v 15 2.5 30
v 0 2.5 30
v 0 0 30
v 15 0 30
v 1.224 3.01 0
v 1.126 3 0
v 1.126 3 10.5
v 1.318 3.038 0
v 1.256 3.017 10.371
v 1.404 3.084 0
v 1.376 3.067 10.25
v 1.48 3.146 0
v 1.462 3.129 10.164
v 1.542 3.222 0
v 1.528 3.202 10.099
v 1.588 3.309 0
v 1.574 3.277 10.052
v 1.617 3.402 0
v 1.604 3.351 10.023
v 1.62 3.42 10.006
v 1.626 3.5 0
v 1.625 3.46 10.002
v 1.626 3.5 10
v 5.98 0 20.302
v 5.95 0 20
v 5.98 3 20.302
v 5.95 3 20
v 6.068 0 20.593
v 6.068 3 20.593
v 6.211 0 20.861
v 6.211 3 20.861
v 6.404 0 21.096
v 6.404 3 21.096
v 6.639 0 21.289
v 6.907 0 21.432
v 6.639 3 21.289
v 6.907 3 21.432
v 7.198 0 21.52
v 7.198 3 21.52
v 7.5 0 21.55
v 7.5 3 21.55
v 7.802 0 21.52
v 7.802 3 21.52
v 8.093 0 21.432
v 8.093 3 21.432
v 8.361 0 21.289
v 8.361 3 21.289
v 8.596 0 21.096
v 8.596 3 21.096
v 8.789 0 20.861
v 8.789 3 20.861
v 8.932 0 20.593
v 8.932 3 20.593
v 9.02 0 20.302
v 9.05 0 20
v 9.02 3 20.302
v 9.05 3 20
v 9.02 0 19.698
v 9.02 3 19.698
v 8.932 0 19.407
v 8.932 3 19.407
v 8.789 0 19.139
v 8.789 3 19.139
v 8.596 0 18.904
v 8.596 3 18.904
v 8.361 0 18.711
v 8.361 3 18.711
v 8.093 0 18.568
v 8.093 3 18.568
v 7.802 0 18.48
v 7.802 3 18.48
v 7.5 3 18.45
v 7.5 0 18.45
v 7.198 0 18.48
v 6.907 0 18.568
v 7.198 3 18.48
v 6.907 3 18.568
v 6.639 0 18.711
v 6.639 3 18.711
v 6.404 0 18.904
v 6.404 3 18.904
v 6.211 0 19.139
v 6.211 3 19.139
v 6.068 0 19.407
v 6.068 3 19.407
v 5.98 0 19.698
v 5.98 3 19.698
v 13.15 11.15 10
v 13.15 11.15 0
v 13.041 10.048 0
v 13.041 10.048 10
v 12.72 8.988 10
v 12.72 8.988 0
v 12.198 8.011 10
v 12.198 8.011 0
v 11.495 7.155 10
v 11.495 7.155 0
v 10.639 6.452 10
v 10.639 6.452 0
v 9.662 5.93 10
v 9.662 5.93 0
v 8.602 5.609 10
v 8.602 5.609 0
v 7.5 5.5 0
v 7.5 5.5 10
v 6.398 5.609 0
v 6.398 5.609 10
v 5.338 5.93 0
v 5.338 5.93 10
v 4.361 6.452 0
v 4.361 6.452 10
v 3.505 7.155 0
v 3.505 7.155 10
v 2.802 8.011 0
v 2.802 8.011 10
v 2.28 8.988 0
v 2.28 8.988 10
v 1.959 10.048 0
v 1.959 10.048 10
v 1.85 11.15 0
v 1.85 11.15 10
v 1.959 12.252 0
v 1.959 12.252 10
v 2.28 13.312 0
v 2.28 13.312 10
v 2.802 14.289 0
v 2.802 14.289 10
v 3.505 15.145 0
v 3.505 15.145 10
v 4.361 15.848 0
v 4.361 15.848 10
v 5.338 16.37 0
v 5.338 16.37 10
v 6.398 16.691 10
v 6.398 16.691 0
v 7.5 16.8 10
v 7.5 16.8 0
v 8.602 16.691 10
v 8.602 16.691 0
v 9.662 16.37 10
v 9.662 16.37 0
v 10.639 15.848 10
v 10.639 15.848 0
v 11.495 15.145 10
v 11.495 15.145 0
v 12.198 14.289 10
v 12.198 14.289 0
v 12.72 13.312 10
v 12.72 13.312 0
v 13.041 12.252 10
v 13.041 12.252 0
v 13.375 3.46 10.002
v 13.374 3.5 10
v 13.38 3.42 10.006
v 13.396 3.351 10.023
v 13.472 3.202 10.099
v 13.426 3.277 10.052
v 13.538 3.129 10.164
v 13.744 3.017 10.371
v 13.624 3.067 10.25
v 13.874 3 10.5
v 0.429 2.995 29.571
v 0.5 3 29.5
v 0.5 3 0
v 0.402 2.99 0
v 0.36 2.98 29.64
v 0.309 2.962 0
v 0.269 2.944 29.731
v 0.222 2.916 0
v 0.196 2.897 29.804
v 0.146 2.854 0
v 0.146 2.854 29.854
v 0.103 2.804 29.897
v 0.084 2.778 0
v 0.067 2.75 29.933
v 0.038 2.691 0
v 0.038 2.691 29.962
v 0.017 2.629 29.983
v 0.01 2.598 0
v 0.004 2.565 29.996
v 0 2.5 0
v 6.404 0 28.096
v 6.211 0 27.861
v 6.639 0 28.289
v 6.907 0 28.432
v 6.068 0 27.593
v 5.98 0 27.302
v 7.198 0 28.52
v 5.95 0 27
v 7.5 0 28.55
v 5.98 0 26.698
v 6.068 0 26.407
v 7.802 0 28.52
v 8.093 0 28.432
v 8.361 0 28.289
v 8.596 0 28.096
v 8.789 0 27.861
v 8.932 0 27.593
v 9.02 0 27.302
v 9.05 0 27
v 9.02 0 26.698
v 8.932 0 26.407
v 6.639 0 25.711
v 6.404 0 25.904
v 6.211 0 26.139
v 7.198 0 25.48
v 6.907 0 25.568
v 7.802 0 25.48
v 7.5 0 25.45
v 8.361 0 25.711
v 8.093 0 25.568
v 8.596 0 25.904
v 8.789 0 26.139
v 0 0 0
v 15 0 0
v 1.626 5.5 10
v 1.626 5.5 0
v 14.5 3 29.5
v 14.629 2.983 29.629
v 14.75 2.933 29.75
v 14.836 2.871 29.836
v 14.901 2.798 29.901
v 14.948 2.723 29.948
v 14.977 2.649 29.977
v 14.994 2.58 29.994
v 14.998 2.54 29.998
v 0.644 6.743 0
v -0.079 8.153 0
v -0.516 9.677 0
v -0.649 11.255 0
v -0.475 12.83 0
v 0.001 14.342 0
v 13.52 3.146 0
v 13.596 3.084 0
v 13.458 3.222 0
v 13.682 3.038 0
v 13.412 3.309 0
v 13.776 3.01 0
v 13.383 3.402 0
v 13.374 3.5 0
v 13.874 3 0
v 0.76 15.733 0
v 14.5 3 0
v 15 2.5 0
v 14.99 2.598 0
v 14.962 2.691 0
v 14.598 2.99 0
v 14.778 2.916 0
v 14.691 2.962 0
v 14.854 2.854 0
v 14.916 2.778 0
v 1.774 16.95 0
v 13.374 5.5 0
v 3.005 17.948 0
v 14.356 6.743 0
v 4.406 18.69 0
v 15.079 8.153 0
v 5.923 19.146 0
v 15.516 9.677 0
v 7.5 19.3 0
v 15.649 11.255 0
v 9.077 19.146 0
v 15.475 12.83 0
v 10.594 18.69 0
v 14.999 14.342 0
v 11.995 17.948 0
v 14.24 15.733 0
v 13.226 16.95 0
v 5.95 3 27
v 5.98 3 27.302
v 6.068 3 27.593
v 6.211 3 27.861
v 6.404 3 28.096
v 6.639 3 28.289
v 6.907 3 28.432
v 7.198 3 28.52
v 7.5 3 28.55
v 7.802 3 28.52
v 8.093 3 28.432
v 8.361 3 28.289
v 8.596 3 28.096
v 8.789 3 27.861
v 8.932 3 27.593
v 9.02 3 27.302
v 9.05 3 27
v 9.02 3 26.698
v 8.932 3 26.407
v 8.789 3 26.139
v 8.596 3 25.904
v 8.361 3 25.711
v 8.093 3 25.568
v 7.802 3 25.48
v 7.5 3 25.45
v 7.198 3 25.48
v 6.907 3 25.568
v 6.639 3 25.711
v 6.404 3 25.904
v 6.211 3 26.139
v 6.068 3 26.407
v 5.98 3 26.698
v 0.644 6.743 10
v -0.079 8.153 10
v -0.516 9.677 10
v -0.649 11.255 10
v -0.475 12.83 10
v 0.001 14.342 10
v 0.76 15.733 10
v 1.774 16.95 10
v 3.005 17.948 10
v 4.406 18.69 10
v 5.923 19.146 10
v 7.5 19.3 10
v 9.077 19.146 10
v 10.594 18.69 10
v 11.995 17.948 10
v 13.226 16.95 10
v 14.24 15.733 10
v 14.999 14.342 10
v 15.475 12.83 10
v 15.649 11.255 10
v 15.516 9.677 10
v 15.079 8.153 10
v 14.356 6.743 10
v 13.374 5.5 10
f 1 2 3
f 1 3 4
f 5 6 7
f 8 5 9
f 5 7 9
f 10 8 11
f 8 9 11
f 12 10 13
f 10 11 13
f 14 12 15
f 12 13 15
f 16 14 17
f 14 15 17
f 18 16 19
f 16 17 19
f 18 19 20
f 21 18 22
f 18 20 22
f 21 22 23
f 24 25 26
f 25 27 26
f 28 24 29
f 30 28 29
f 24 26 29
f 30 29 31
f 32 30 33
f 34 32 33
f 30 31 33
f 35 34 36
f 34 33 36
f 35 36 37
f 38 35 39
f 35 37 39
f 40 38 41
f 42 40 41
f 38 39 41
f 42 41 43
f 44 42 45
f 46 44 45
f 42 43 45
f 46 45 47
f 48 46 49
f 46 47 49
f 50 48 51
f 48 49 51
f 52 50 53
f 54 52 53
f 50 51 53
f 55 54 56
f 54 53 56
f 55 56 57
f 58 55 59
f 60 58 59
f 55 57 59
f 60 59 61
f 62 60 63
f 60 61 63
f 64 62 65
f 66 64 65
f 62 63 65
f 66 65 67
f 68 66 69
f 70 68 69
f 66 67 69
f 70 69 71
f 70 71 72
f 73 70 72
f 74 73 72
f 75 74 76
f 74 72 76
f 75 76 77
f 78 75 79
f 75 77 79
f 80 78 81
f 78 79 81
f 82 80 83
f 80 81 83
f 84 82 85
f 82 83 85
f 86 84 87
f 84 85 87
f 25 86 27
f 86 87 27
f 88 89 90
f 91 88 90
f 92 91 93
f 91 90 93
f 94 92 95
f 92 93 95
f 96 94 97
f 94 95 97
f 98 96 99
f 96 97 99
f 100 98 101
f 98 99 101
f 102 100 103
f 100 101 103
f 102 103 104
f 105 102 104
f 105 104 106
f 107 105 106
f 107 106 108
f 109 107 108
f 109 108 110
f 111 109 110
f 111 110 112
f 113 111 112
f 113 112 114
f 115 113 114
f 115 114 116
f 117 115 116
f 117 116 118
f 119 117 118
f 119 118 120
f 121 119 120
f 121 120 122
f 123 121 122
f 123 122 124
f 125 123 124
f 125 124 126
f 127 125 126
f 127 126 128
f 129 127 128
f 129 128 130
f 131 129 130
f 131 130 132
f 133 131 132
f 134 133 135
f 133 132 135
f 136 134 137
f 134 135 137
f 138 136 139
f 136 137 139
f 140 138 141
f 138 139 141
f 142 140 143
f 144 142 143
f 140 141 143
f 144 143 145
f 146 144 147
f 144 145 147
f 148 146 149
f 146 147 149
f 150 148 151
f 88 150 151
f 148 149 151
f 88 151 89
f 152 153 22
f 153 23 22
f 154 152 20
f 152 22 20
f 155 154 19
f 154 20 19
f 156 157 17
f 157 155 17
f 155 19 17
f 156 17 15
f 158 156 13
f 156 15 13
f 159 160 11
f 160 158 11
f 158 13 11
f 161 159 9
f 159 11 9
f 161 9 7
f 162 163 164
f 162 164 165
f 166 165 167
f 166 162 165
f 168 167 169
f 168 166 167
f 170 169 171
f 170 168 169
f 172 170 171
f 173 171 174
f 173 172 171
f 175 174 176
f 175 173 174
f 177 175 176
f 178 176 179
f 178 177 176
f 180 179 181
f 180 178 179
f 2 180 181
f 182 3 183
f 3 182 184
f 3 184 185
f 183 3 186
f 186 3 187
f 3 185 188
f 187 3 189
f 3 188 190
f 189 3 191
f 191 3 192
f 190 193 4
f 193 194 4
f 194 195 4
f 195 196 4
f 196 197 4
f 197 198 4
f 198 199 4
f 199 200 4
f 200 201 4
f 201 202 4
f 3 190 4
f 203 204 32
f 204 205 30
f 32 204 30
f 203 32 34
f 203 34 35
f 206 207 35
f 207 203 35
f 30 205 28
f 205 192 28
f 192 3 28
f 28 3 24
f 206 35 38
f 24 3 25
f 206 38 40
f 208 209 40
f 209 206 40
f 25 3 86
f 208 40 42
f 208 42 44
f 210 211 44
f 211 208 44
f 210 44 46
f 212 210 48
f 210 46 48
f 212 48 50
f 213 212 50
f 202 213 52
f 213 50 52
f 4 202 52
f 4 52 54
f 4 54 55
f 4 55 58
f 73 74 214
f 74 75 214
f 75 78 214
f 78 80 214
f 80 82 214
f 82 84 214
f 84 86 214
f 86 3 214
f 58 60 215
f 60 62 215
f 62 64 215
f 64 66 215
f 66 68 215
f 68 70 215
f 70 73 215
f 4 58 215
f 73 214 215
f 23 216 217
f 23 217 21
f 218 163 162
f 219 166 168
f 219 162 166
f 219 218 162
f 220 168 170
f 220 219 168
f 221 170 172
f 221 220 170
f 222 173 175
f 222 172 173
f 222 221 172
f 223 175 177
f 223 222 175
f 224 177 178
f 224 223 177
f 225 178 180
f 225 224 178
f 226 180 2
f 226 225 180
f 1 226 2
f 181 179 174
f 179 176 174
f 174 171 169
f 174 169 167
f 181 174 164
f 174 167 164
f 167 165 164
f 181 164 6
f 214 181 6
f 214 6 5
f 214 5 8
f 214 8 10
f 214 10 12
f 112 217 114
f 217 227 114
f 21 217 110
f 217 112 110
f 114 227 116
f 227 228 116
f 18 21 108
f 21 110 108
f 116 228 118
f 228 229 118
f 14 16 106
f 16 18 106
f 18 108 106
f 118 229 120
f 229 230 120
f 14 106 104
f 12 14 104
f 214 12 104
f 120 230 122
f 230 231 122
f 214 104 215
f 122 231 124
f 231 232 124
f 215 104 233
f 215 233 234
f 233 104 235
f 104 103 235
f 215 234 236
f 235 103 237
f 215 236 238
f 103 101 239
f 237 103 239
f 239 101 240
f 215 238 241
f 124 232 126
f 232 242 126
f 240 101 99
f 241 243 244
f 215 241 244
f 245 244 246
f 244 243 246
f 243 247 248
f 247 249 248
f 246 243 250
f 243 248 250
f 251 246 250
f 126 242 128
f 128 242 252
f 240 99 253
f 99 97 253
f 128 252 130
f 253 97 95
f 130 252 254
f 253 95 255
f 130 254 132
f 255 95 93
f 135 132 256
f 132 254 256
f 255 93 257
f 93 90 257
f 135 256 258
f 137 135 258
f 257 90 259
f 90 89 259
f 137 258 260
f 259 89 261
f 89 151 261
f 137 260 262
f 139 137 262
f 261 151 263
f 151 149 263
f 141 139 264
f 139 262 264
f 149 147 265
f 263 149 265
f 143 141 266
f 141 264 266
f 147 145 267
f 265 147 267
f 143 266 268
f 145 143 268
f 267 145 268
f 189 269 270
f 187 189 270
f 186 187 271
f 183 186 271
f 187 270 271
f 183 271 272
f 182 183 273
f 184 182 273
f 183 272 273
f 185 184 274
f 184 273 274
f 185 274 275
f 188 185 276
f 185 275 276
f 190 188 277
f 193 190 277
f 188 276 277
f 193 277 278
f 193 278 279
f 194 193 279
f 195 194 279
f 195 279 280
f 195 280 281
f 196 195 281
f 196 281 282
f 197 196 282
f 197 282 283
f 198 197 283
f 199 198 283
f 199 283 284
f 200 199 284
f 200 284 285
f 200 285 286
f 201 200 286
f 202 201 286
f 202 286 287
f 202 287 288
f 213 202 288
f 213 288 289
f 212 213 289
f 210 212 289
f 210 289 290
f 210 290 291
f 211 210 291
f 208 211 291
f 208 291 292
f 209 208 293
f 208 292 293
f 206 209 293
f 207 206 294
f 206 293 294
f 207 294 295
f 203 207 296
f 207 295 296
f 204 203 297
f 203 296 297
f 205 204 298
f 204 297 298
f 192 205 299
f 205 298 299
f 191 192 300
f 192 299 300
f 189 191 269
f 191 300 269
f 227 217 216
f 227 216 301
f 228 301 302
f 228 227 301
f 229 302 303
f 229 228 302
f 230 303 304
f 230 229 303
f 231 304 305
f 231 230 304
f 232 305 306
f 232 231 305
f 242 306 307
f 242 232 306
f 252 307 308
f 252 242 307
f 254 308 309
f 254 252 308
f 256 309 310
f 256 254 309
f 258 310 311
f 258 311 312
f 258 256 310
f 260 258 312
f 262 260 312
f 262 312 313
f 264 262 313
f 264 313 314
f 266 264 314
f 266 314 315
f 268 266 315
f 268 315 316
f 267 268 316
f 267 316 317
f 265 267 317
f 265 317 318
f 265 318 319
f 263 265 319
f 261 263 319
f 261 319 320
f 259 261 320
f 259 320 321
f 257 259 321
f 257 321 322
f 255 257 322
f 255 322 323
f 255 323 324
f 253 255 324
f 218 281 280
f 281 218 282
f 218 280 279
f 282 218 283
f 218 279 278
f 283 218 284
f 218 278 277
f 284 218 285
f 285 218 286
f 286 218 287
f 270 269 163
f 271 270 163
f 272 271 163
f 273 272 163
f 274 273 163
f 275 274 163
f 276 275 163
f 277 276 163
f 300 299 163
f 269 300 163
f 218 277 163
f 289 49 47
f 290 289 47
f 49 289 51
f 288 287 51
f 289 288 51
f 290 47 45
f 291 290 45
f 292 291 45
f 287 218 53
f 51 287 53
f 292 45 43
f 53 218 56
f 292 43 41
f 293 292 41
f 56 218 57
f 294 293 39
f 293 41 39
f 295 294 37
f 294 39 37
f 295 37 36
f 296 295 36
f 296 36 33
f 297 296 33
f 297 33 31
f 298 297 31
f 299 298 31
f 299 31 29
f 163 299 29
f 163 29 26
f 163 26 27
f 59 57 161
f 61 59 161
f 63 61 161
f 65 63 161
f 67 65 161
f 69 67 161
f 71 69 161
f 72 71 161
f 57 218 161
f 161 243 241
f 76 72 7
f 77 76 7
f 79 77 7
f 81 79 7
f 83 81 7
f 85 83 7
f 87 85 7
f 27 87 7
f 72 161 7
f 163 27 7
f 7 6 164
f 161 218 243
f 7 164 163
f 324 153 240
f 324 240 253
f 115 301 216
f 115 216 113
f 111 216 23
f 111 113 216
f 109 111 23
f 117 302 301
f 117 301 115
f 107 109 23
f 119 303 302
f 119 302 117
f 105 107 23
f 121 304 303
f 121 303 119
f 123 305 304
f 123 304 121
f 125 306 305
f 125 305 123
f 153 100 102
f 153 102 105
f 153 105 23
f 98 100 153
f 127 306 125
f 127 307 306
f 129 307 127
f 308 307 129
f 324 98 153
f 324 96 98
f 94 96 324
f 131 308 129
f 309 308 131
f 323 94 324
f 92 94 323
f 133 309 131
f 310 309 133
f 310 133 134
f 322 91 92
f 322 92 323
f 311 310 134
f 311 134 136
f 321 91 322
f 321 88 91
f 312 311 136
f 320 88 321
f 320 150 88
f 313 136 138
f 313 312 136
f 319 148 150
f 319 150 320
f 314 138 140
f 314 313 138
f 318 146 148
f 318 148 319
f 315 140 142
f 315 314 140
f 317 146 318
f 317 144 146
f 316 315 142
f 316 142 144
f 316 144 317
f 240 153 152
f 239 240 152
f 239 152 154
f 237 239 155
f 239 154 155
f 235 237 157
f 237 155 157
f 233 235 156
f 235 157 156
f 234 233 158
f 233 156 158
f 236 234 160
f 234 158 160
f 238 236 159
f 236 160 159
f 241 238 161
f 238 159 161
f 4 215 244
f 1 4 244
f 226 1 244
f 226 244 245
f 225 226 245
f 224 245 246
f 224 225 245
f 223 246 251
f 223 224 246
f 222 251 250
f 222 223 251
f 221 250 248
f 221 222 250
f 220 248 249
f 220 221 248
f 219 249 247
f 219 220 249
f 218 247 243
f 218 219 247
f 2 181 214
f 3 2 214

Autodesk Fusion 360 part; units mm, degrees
sketch "Sketch1" plane through (0, 0, 0) normal (0, 0, 1) x (1, 0, 0)
  line L0 (0, 0) -> (15, 0)
  line L1 (15, 0) -> (15, 3)
  line L2 (15, 3) -> (0, 3)
  line L3 (0, 3) -> (0, 0)
  line L4 (1.6263, 3) -> (13.3737, 3)
  line L5 (13.3737, 3) -> (13.3737, 5.5)
  line L6 (13.3737, 5.5) -> (1.6263, 5.5)
  line L7 (1.6263, 5.5) -> (1.6263, 3)
  circle A0 centre (7.5, 11.15) radius 8.15
  circle A1 centre (7.5, 11.15) radius 5.65
  line L8 (7.5, 0) -> (7.5, 3) construction
  line L9 (7.5, 5.5) -> (7.5, 3) construction
  dimension "d1" = 11.3
  dimension "d2" = 15
  dimension "d4" = 3
  dimension "d19" = 2.5
extrude "Extrude1" add sketch "Sketch1" along normal blind 10 contours L2 L4 L7 A0 | L2 L4 L5 A0 | L6 A0 | L6 A0
extrude "Extrude2" add sketch "Sketch1" along normal blind 30 contours L0 L1 L2 L3 L4
sketch "Sketch2" plane through (0, 3, 0) normal (0, 1, 0) x (-1, 0, 0)
  line L0 (-13.3737, 0) -> (-13.3737, 10)
  line L1 (-13.3737, 10) -> (-1.6263, 10)
  line L2 (-1.6263, 10) -> (-1.6263, 0)
  line L3 (-1.6263, 0) -> (0, 0)
  line L4 (0, 0) -> (0, 30)
  line L5 (0, 30) -> (-15, 30)
  line L6 (-15, 30) -> (-15, 0)
  line L7 (-15, 0) -> (-13.3737, 0)
  line L8 (-7.5, 30) -> (-7.5, 10) construction
  circle A0 centre (-7.5, 27) radius 1.55
  circle A1 centre (-7.5, 20) radius 1.55
  dimension "d9" = 3.1
  dimension "d10" = 3.1
  dimension "d11" = 7
  dimension "d12" = 3
extrude "Extrude3" cut sketch "Sketch2" against normal up to surface (3 mm away) contours A0 | A1
fillet "Fillet1" radius 0.5 3 edges at (0, 3, 15) (7.5, 3, 30) (15, 3, 15)
fillet "Fillet2" radius 0.5 3 edges at (13.3737, 3, 5) (7.5, 3, 10) (1.6263, 3, 5)
equation "d10 = d9"
